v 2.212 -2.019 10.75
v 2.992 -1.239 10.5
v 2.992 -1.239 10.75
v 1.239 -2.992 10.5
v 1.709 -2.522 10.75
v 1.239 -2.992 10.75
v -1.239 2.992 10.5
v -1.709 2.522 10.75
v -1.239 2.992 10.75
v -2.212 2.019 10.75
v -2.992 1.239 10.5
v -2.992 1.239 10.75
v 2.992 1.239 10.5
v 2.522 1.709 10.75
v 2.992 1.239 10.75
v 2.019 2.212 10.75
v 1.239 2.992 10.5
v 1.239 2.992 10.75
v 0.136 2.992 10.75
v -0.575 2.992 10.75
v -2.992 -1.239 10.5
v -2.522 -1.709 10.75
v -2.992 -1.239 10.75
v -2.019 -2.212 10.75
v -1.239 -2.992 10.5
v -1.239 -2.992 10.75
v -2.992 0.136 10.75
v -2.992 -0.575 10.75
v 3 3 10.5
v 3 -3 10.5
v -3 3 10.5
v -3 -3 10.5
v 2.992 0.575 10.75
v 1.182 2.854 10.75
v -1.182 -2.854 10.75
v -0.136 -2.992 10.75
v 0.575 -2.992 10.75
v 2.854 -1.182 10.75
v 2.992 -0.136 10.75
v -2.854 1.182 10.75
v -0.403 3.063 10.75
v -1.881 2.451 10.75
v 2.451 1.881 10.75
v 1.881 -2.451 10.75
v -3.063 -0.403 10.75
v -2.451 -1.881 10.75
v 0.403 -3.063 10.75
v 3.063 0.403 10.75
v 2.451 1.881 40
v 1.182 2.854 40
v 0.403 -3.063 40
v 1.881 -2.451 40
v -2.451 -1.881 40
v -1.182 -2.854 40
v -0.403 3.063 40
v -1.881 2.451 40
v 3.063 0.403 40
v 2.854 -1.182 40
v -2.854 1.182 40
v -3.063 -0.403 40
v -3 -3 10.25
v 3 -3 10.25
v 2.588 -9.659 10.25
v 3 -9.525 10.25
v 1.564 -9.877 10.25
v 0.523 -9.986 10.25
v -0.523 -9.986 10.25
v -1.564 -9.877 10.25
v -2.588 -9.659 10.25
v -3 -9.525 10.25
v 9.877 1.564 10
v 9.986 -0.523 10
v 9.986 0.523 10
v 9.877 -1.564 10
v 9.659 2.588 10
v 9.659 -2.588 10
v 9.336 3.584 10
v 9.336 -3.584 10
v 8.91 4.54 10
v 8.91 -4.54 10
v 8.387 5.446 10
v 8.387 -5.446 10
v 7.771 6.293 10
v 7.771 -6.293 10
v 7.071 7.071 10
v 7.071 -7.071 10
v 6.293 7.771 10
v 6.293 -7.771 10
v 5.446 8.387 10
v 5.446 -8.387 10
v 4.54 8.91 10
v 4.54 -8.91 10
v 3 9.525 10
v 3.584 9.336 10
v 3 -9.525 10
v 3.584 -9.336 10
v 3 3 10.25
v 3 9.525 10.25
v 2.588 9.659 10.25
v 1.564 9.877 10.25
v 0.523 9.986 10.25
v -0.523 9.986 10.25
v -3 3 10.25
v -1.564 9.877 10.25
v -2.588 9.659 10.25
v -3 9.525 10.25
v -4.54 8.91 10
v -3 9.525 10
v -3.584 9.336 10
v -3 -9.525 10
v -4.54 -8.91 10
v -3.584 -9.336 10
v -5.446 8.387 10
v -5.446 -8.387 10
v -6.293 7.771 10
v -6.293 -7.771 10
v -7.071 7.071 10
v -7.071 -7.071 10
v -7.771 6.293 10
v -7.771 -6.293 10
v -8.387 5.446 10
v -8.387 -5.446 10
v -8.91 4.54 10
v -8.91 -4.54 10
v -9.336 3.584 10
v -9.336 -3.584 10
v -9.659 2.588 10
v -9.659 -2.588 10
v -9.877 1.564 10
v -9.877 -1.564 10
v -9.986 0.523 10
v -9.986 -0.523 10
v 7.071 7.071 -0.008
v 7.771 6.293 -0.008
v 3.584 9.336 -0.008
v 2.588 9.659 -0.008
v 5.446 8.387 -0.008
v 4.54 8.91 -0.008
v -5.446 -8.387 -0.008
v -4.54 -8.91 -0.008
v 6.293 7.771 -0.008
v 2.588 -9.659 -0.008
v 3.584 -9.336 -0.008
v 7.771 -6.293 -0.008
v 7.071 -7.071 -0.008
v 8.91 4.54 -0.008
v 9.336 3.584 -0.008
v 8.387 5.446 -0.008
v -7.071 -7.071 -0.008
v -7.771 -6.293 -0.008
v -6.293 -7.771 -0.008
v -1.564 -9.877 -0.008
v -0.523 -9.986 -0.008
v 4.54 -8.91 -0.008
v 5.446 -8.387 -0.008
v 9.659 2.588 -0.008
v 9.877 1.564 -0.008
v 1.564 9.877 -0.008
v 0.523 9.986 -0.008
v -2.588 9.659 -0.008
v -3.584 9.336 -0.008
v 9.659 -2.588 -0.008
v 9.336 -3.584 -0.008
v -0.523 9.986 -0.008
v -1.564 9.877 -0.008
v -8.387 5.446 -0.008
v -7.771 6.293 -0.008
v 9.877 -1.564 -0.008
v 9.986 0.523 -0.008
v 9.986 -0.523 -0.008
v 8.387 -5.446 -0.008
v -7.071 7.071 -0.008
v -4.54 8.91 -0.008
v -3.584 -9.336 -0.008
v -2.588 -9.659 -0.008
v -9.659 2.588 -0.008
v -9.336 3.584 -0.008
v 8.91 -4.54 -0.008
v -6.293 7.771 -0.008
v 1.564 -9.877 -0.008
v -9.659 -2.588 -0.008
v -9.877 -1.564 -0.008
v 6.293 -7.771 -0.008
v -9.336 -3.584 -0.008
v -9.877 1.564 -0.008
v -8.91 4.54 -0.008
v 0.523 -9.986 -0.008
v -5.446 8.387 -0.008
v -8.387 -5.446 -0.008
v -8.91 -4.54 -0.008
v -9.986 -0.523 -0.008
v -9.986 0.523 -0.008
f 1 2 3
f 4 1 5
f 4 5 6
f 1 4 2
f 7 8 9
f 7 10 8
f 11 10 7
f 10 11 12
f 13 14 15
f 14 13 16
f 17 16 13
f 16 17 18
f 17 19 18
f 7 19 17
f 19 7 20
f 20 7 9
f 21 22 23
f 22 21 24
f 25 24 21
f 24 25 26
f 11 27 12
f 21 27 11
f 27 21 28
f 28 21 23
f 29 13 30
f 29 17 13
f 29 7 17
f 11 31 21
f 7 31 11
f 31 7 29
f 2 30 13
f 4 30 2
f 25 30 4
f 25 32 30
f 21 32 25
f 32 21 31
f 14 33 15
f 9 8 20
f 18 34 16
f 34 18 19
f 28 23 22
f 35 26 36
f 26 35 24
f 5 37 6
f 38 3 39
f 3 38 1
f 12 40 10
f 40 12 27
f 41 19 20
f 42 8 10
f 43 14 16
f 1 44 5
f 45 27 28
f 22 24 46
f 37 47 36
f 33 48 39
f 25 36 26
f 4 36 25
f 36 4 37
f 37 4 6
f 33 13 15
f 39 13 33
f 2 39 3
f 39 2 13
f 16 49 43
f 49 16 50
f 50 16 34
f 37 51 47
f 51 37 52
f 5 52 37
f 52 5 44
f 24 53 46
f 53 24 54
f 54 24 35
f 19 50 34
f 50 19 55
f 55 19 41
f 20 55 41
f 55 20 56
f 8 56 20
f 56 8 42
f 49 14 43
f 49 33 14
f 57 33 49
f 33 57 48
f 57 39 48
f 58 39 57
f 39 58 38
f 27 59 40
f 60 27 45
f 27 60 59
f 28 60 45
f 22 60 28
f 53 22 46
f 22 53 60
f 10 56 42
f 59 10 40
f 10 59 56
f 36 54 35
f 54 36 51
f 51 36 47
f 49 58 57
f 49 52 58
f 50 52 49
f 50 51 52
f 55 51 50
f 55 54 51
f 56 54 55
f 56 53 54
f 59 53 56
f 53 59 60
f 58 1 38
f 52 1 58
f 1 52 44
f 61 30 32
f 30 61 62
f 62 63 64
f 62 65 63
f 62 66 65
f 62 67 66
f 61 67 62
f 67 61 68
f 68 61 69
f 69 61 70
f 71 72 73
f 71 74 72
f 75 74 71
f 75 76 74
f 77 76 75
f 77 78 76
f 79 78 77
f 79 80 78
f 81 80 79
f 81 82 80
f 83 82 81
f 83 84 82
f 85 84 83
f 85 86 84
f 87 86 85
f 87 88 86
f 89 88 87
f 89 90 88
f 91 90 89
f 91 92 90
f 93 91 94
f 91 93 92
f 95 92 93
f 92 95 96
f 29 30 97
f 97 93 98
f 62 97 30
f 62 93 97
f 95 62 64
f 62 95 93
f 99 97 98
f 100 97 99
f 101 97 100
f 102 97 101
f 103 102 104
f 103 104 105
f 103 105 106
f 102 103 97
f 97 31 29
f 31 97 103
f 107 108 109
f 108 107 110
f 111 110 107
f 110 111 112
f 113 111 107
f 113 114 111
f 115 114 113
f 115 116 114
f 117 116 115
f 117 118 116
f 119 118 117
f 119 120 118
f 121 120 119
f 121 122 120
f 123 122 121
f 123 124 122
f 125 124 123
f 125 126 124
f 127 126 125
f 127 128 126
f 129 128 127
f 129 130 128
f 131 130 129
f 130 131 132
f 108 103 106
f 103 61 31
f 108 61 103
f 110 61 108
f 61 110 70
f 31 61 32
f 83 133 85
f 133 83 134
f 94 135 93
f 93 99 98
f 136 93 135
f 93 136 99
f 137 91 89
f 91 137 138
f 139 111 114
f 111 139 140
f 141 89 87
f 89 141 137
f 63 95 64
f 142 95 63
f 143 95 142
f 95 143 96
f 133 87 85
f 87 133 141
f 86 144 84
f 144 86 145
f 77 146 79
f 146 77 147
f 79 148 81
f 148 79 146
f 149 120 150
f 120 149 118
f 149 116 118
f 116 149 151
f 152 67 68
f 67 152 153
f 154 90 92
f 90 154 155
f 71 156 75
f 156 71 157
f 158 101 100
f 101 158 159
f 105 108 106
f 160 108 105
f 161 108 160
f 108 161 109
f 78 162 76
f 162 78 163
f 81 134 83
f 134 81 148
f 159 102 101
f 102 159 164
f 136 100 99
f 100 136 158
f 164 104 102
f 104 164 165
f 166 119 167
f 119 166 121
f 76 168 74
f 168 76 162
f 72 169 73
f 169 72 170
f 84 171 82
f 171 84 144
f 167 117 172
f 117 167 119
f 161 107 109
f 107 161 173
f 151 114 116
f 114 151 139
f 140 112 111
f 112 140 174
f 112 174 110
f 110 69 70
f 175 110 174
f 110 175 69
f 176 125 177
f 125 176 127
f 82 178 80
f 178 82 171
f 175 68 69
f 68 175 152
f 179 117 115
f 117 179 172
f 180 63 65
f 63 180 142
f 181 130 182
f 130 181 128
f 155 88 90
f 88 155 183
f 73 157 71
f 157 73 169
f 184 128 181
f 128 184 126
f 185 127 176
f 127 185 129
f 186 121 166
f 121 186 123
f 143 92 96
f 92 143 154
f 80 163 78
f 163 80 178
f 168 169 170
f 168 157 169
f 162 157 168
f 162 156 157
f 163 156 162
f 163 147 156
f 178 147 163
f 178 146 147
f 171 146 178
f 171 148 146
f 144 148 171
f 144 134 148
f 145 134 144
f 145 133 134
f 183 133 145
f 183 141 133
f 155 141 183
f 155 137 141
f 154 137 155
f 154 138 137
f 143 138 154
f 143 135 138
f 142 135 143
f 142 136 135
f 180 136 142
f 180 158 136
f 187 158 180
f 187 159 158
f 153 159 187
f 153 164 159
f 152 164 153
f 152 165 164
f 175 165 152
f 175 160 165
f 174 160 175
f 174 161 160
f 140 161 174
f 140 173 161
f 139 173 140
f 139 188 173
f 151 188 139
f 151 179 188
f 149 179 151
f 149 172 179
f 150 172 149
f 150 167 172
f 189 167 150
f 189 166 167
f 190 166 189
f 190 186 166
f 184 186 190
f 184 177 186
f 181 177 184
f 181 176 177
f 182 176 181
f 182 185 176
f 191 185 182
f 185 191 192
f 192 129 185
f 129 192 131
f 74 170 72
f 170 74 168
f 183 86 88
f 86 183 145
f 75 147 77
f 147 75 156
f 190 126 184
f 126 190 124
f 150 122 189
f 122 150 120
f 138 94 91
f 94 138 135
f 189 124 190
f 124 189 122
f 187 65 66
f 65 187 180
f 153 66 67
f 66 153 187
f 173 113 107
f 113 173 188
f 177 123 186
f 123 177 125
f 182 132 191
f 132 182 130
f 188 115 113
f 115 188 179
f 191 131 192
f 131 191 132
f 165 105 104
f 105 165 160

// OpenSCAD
// file: ../utils/core/clip.scad
//
// NopSCADlib Copyright Chris Palmer 2018
// nop.head@gmail.com
// hydraraptor.blogspot.com
//
// This file is part of NopSCADlib.
//
// NopSCADlib is free software: you can redistribute it and/or modify it under the terms of the
// GNU General Public License as published by the Free Software Foundation, either version 3 of
// the License, or (at your option) any later version.
//
// NopSCADlib is distributed in the hope that it will be useful, but WITHOUT ANY WARRANTY;
// without even the implied warranty of MERCHANTABILITY or FITNESS FOR A PARTICULAR PURPOSE.
// See the GNU General Public License for more details.
//
// You should have received a copy of the GNU General Public License along with NopSCADlib.
// If not, see <https://www.gnu.org/licenses/>.
//

//
//! Construct arbirarily large box to partition 3D space and clip objects, useful for creating cross sections to see the inside when debugging.
//!
//! Original version by Doug Moen on the OpenSCAD forum
//
//
module box(xmin, ymin, zmin, xmax, ymax, zmax) //! Construct a box given its bounds
    polyhedron(
        [[xmin, ymin, zmin],  // 0
         [xmin, ymin, zmax],  // 1
         [xmin, ymax, zmin],  // 2
         [xmin, ymax, zmax],  // 3
         [xmax, ymin, zmin],  // 4
         [xmax, ymin, zmax],  // 5
         [xmax, ymax, zmin],  // 6
         [xmax, ymax, zmax]], // 7
        [[7,5,1,3],  // top
         [2,0,4,6],  // bottom
         [5,4,0,1],  // front
         [3,2,6,7],  // back
         [5,7,6,4],  // right
         [0,2,3,1]]  // left
    );

module clip(xmin = -inf, ymin = -inf, zmin = -inf, xmax = inf, ymax = inf, zmax = inf) //! Clip child to specified boundaries
    render() intersection() {
        children();

        box(xmin, ymin, zmin, xmax, ymax, zmax);
    }
// file: ../utils/core/rounded_rectangle.scad
//
// NopSCADlib Copyright Chris Palmer 2018
// nop.head@gmail.com
// hydraraptor.blogspot.com
//
// This file is part of NopSCADlib.
//
// NopSCADlib is free software: you can redistribute it and/or modify it under the terms of the
// GNU General Public License as published by the Free Software Foundation, either version 3 of
// the License, or (at your option) any later version.
//
// NopSCADlib is distributed in the hope that it will be useful, but WITHOUT ANY WARRANTY;
// without even the implied warranty of MERCHANTABILITY or FITNESS FOR A PARTICULAR PURPOSE.
// See the GNU General Public License for more details.
//
// You should have received a copy of the GNU General Public License along with NopSCADlib.
// If not, see <https://www.gnu.org/licenses/>.
//

//
//! Rectangle with rounded corners.
//
module rounded_square(size, r, center = true) //! Like ```square()``` but with with rounded corners
{
    $fn = r2sides4n(r);
    offset(r) offset(-r) square(size, center = center);
}

module rounded_rectangle(size, r, center = true, xy_center = true) //! Like ```cube()``` but corners rounded in XY plane and separate centre options for xy and z.
{
    linear_extrude(height = size[2], center = center)
        rounded_square([size[0], size[1]], r, xy_center);
}
// file: ../utils/core/teardrops.scad
//
// NopSCADlib Copyright Chris Palmer 2018
// nop.head@gmail.com
// hydraraptor.blogspot.com
//
// This file is part of NopSCADlib.
//
// NopSCADlib is free software: you can redistribute it and/or modify it under the terms of the
// GNU General Public License as published by the Free Software Foundation, either version 3 of
// the License, or (at your option) any later version.
//
// NopSCADlib is distributed in the hope that it will be useful, but WITHOUT ANY WARRANTY;
// without even the implied warranty of MERCHANTABILITY or FITNESS FOR A PARTICULAR PURPOSE.
// See the GNU General Public License for more details.
//
// You should have received a copy of the GNU General Public License along with NopSCADlib.
// If not, see <https://www.gnu.org/licenses/>.
//

//
//! For making horizontal holes that don't need support material.
//! Small holes can get away without it, but they print better with truncated teardrops.
//
module teardrop(h, r, center = true, truncate = true) //! For making horizontal holes that don't need support material, set ```truncate = false``` to make traditional RepRap teardrops that don't even need bridging
    render(convexity = 5)
        extrude_if(h, center)
           hull() {
                circle4n(r);

                if(truncate)
                    translate([0, r / 2])
                        square([2 * r * (sqrt(2) - 1), r], center = true);
                else
                    polygon([[0, 0], [eps, 0], [0, r * sqrt(2)]]);
            }

module teardrop_plus(h, r, center = true, truncate = true) //! Slightly bigger teardrop to allow for the 3D printing staircase effect
    teardrop(h, r + layer_height / 4, center, truncate);

module tearslot(h, r, w, center = true) //! A horizontal slot that doesn't need support material
    extrude_if(h, center)
        hull() {
            translate([-w/2,0,0]) teardrop(r = r, h = 0);
            translate([ w/2,0,0]) teardrop(r = r, h = 0);
        }

module vertical_tearslot(h, r, l, center = true) //! A vertical slot that doesn't need support material
    extrude_if(h, center)
        hull() {
            translate([0,  l / 2]) teardrop(0, r, true);
            translate([0, -l / 2])
                circle4n(r);
        }
// file: ../utils/core/polyholes.scad
//
// NopSCADlib Copyright Chris Palmer 2018
// nop.head@gmail.com
// hydraraptor.blogspot.com
//
// This file is part of NopSCADlib.
//
// NopSCADlib is free software: you can redistribute it and/or modify it under the terms of the
// GNU General Public License as published by the Free Software Foundation, either version 3 of
// the License, or (at your option) any later version.
//
// NopSCADlib is distributed in the hope that it will be useful, but WITHOUT ANY WARRANTY;
// without even the implied warranty of MERCHANTABILITY or FITNESS FOR A PARTICULAR PURPOSE.
// See the GNU General Public License for more details.
//
// You should have received a copy of the GNU General Public License along with NopSCADlib.
// If not, see <https://www.gnu.org/licenses/>.
//

//
//! A method of making 3D printed holes come out the right size regardless of the printer, providing
//! it gets the linear dimensions right. See <https://hydraraptor.blogspot.com/2011/02/polyholes.html>
//!
//! The module provides `poly_circle()`, `poly_cylinder()` and `poly_ring()` that is useful for making printed washers and pillars.
//
function sides(r) = max(round(4 * r), 3); //! Optimium number of sides for specified radius
function corrected_radius(r, n = 0)   = r / cos(180 / (n ? n : sides(r))); //! Adjusted radius to make flats lie on the circle
function corrected_diameter(d, n = 0) = d / cos(180 / (n ? n : sides(d / 2))); //! Adjusted diameter to make flats lie on the circle

module poly_circle(r, sides = 0) { //! Make a circle adjusted to print the correct size
    n = sides ? sides : sides(r);
    circle(r = corrected_radius(r,n), $fn = n);
}

module poly_cylinder(r, h, center = false, sides = 0) //! Make a cylinder adjusted to print the correct size
    extrude_if(h, center)
        poly_circle(r, sides);

module poly_ring(or, ir) { //! Make a 2D ring adjusted to have the correct internal radius
    cir = corrected_radius(ir);
    filaments = floor((or - cir) / extrusion_width);
    if(filaments > 3)
        difference() {
            circle(or);

            poly_circle(ir);
        }
    else
        if(filaments >= 2)
            difference() {
                offset(or - cir)
                    poly_circle(ir);

                poly_circle(ir);
            }
            else
                difference() {
                    poly_circle(or);

                    offset(-squeezed_wall)
                        poly_circle(or);
                }
}

module drill(r, h = 100) //! Make a cylinder for drilling holes suitable for CNC routing, set h = 0 for circle
    extrude_if(h)
        circle(r = corrected_radius(r, r2sides(r)));
//
// Horizontal slot
//
module slot(r, l, h = 100) //! Make a horizontal slot suitable for CNC routing, set h = 0 for 2D version
    extrude_if(h)
        hull() {
            translate([l / 2,0])
                drill(r, 0);

            translate([-l / 2,0])
                drill(r, 0);
        }
// file: ../utils/core/bom.scad
//
// NopSCADlib Copyright Chris Palmer 2018
// nop.head@gmail.com
// hydraraptor.blogspot.com
//
// This file is part of NopSCADlib.
//
// NopSCADlib is free software: you can redistribute it and/or modify it under the terms of the
// GNU General Public License as published by the Free Software Foundation, either version 3 of
// the License, or (at your option) any later version.
//
// NopSCADlib is distributed in the hope that it will be useful, but WITHOUT ANY WARRANTY;
// without even the implied warranty of MERCHANTABILITY or FITNESS FOR A PARTICULAR PURPOSE.
// See the GNU General Public License for more details.
//
// You should have received a copy of the GNU General Public License along with NopSCADlib.
// If not, see <https://www.gnu.org/licenses/>.
//

//
//! Bill Of Materials generation via echo and the ```bom.py``` script. Also handles exploded assembly views and posing. Assembly instructions can precede the module
//! definition that makes the assembly.
//!
//! The example below shows how to define a vitamin and incorporate it into an assembly with sub-assemblies and make an exploded view. The resulting flat BOM is shown but
//! heirachical BOMs are also generated for real projects.
//
function bom_mode(n = 1) = $_bom >= n && (is_undef($on_bom) || $on_bom);  //! Current BOM mode, 0 = none, 1 = printed and routed parts and assemblies, 2 includes vitamins as well
function exploded() = is_undef($exploded_parent) ? $exploded : 0;   //! Returns the value of ```$exploded``` if it is defined, else ```0```
function show_supports() = !$preview || exploded();                 //! True if printed support material should be shown

module no_explode() let($exploded_parent = true) children();        //! Prevent children being exploded
module no_pose() let($posed = true) children();                     //! Force children not to be posed even if parent is

module explode(d, explode_children = false, offset = [0,0,0]) {     //! Explode children by specified Z distance or vector ```d```, option to explode grand children
    v = is_list(d) ? d : [0, 0, d];
    o = is_list(offset) ? offset : [0, 0, offset];
    if($exploded && is_undef($exploded_parent)) {
        translate(o)                                                // Draw the line first in case the child is transparent
            hull() {
                sphere(0.2);

                translate(v * $exploded)
                    sphere(0.2);
            }

        translate(v * $exploded)
            let($exploded_parent = explode_children ? undef : true)
                children();
    }
    else
        children();
}

module pose(a = [55, 0, 25], t = [0, 0, 0], exploded = undef)       //! Pose an STL or assembly for rendering to png by specifying rotation ```a``` and translation ```t```, ```exploded = true for``` just the exploded view or ```false``` for unexploded only.
    if(is_undef($pose) || !is_undef($posed) || (!is_undef(exploded) && exploded != !!exploded()))
        children();
    else
        let($posed = true) // only pose the top level
            rotate([55, 0, 25])
                rotate([-a.x, 0, 0])
                    rotate([0, -a.y, 0])
                        rotate([0, 0, -a.z])
                            translate(-t)
                                children();


module assembly(name) {                 //! Name an assembly that will appear on the BOM, there needs to a module named ```<name>_assembly``` to make it
    if(bom_mode())
        echo(str("~", name, "_assembly{"));

    no_pose()
        if(is_undef($child_assembly))
            let($child_assembly = true)
                children();
        else
            no_explode()
                children();

    if(bom_mode())
        echo(str("~}", name, "_assembly"));
}

module stl(name) {                      //! Name an stl that will appear on the BOM, there needs to a module named ```<name>_stl``` to make it
    if(bom_mode())
        echo(str("~", name, ".stl"));
}

module dxf(name) {                      //! Name a dxf that will appear on the BOM, there needs to a module named ```<name>_dxf``` to make it
    if(bom_mode())
        echo(str("~", name, ".dxf"));
}

function value_string(value) = is_string(value) ? str("\"", value, "\"") : str(value); //! Convert ```value``` to a string or quote it if it is already a string

function arg(value, default, name = "") =   //! Create string for arg if not default, helper for ```vitamin()```
    value == default ? ""
                     : name ? str(", ", name, " = ", value_string(value))
                            : str(", ", value_string(value));

module vitamin(description) {                //! Describe a vitamin for the BOM entry and precede it with a module call that creates it, eg. "wigit(42): Type 42 widget"
    if(bom_mode(2))
        echo(str("~", description, !is_undef($hidden) ? " - not shown" : ""));
}

module not_on_bom(on = false)               //! Specify the following child parts are not on the BOM, for example when they are on a PCB that comes assembled
    let($on_bom = on)
        children();

module hidden()                             //! Make item invisible, except on the BOM
    scale(1 / sqr(1024))
        let($hidden = true)
            children();
// file: ../utils/core/sphere.scad
//
// NopSCADlib Copyright Chris Palmer 2018
// nop.head@gmail.com
// hydraraptor.blogspot.com
//
// This file is part of NopSCADlib.
//
// NopSCADlib is free software: you can redistribute it and/or modify it under the terms of the
// GNU General Public License as published by the Free Software Foundation, either version 3 of
// the License, or (at your option) any later version.
//
// NopSCADlib is distributed in the hope that it will be useful, but WITHOUT ANY WARRANTY;
// without even the implied warranty of MERCHANTABILITY or FITNESS FOR A PARTICULAR PURPOSE.
// See the GNU General Public License for more details.
//
// You should have received a copy of the GNU General Public License along with NopSCADlib.
// If not, see <https://www.gnu.org/licenses/>.
//

//! Redefines `sphere()` to always have a vertex on all six half axes I.e. vertices at the poles and the equator and `$fn` a multiple of four.
//! This ensures `hull` and `minkowski` results have the correct dimensions when spheres are placed at the corners.

module sphere(r = 1, d = undef) {                   //! Override ```sphere``` so that has vertices on all three axes. Has the advantage of giving correct dimensions when hulled
    R = is_undef(d) ? r : d / 2;
    rotate_extrude($fn = r2sides4n(R))
        rotate(-90)
            semi_circle(R);
}
// file: ../utils/core/global.scad
//
// NopSCADlib Copyright Chris Palmer 2018
// nop.head@gmail.com
// hydraraptor.blogspot.com
//
// This file is part of NopSCADlib.
//
// NopSCADlib is free software: you can redistribute it and/or modify it under the terms of the
// GNU General Public License as published by the Free Software Foundation, either version 3 of
// the License, or (at your option) any later version.
//
// NopSCADlib is distributed in the hope that it will be useful, but WITHOUT ANY WARRANTY;
// without even the implied warranty of MERCHANTABILITY or FITNESS FOR A PARTICULAR PURPOSE.
// See the GNU General Public License for more details.
//
// You should have received a copy of the GNU General Public License along with NopSCADlib.
// If not, see <https://www.gnu.org/licenses/>.
//

//
//! Global constants, functions and modules. This file is used directly or indirectly in every scad file.
//
include <../../global_defs.scad>

function sqr(x) = x * x;                                                            //! Returns the square of ```x```
function inch(x) = x * 25.4;                                                        //! Inch to mm conversion
function echoit(x) = echo(x) x;                                                     //! Echo expression and return it, useful for debugging
function in(list, x) = !!len([for(v = list) if(v == x) true]);                      //! Returns true if ```x``` is an element in the ```list```
function Len(x) = is_list(x) ? len(x) : 0;                                          //! Returns the length of a list or 0 if ```x``` is not a list
function r2sides(r) = $fn ? $fn : ceil(max(min(360/ $fa, r * 2 * PI / $fs), 5));    //! Replicates the OpenSCAD logic to calculate the number of sides from the radius
function r2sides4n(r) = floor((r2sides(r) + 3) / 4) * 4;                            //! Round up the number of sides to a multiple of 4 to ensure points land on all axes

module translate_z(z) translate([0, 0, z]) children();                              //! Shortcut for Z only translations
module vflip() rotate([180, 0, 0]) children();                                      //! Invert children by doing a 180 flip around the X axis
module ellipse(xr, yr) scale([1, yr / xr]) circle4n(xr);                            //! Draw an ellipse

module extrude_if(h, center = true)                 //! Extrudes 2D object to 3D when ```h``` is nonzero, otherwise leaves it 2D
    if(h)
        linear_extrude(height = h, center = center) // 3D
            children();
    else
        children();                                 // 2D

module circle4n(r, d = undef) {                     //! Circle with multiple of 4 vertices
    R = is_undef(d) ? r : d / 2;
    circle(R, $fn = r2sides4n(R));
}

module semi_circle(r, d = undef)                    //! A semi circle in the positive Y domain
    intersection() {
        R = is_undef(d) ? r : d / 2;
        circle4n(R);

        sq = R + 1;
        translate([-sq, 0])
            square([2 * sq, sq]);
    }

include <sphere.scad>
include <bom.scad>
include <polyholes.scad>
include <teardrops.scad>
include <rounded_rectangle.scad>
include <clip.scad>
// file: ../core.scad
//
// NopSCADlib Copyright Chris Palmer 2018
// nop.head@gmail.com
// hydraraptor.blogspot.com
//
// This file is part of NopSCADlib.
//
// NopSCADlib is free software: you can redistribute it and/or modify it under the terms of the
// GNU General Public License as published by the Free Software Foundation, either version 3 of
// the License, or (at your option) any later version.
//
// NopSCADlib is distributed in the hope that it will be useful, but WITHOUT ANY WARRANTY;
// without even the implied warranty of MERCHANTABILITY or FITNESS FOR A PARTICULAR PURPOSE.
// See the GNU General Public License for more details.
//
// You should have received a copy of the GNU General Public License along with NopSCADlib.
// If not, see <https://www.gnu.org/licenses/>.
//

//
// Include this file to use the library
//
include <global_defs.scad>
//
// Global functions and modules
//
use <utils/core/global.scad>
// file: ../utils/hanging_hole.scad
//
// NopSCADlib Copyright Chris Palmer 2018
// nop.head@gmail.com
// hydraraptor.blogspot.com
//
// This file is part of NopSCADlib.
//
// NopSCADlib is free software: you can redistribute it and/or modify it under the terms of the
// GNU General Public License as published by the Free Software Foundation, either version 3 of
// the License, or (at your option) any later version.
//
// NopSCADlib is distributed in the hope that it will be useful, but WITHOUT ANY WARRANTY;
// without even the implied warranty of MERCHANTABILITY or FITNESS FOR A PARTICULAR PURPOSE.
// See the GNU General Public License for more details.
//
// You should have received a copy of the GNU General Public License along with NopSCADlib.
// If not, see <https://www.gnu.org/licenses/>.
//

//
//! Method to print holes in mid air. See <https://hydraraptor.blogspot.com/2014/03/buried-nuts-and-hanging-holes.html>
//
include <../core.scad>

module hanging_hole(z, ir, h = 100, h2 = 100) { //! Hole radius ```ir``` hanging at the specified ```z``` value above a void who's shape is given by a 2D child
    module polyhole(r, h, n = 8) {
        if(h > 0)
            rotate(180 / n) {
                poly_cylinder(r = r, h = layer_height, sides = n);

                translate_z(layer_height)
                    if(2 * n <= sides(r))
                        polyhole(r - eps, h - layer_height, n * 2);
                    else
                        poly_cylinder(r - eps, h - layer_height);
            }
    }
    assert(z % layer_height == 0, str(z));
    infill_angle = z % (2 * layer_height) ? -45 : 45;
    below = min(z + eps, h2);
    big = 1000;

    render(convexity = 3) translate_z(z)
        union() {
            translate_z(2 * layer_height)
                polyhole(ir - eps, h - 2 * layer_height);

            difference() {
                translate_z(-below)
                    linear_extrude(height = below + 2 * layer_height)
                        children();

                rotate(infill_angle)
                    for(side = [-1, 1]) {
                        translate([side * (ir + big), 0, big + layer_height])
                            cube(2 * big, center = true);

                        translate([0, side * (ir + big), big])
                            cube(2 * big, center = true);

                    }
            }
        }
}
// file: ../global_defs.scad
//
// NopSCADlib Copyright Chris Palmer 2018
// nop.head@gmail.com
// hydraraptor.blogspot.com
//
// This file is part of NopSCADlib.
//
// NopSCADlib is free software: you can redistribute it and/or modify it under the terms of the
// GNU General Public License as published by the Free Software Foundation, either version 3 of
// the License, or (at your option) any later version.
//
// NopSCADlib is distributed in the hope that it will be useful, but WITHOUT ANY WARRANTY;
// without even the implied warranty of MERCHANTABILITY or FITNESS FOR A PARTICULAR PURPOSE.
// See the GNU General Public License for more details.
//
// You should have received a copy of the GNU General Public License along with NopSCADlib.
// If not, see <https://www.gnu.org/licenses/>.
//

//
// This file included directly or indirectly in every scad file.
//
// This scheme allows the following:
//  bom defaults to 0
//  Setting $bom on the command line or in the main file before including lib.scad overrides it everywhere.
//  Setting $bom after including lib overrides bom in the libs but not in the local file.
//  Setting $_bom in the local file overrides it in the local file but not in the libs.
//
//function is_undef(x) = x == undef;

$_bom           = is_undef($bom)             ? 0      : $bom;             // 0 no bom, 1 assemblies and stls, 2 vitamins as well
$exploded       = is_undef($explode)         ? 0      : $explode;         // 1 for exploded view
layer_height    = is_undef($layer_height)    ? 0.25   : $layer_height;    // layer heigth when printing
extrusion_width = is_undef($extrusion_width) ? 0.5    : $extrusion_width; // filament width when printing
nozzle          = is_undef($nozzle)          ? 0.45   : $nozzle;          // 3D printer nozzle
cnc_bit_r       = is_undef($cnc_bit_r)       ? 1.2    : $cnc_bit_r;       // miniumum tool radius when milling 2D objects
pp1_colour      = is_undef($pp1_colour)      ? "lime" : $pp1_colour;      // printed part colour 1
pp2_colour      = is_undef($pp2_colour)      ? "red"  : $pp2_colour;      // printed part colour 2
pp3_colour      = is_undef($pp3_colour)      ? "blue" : $pp3_colour;      // printed part colour 3
pp4_colour      = is_undef($pp4_colour)      ? "darkorange" : $pp4_colour;// printed part colour 4
show_rays       = is_undef($show_rays)       ? false  : $show_rays;       // show camera sight lines and light direction

// Minimum wall is about two filaments wide but we extrude it closer to get better bonding
squeezed_wall = $preview ? 2 * extrusion_width - layer_height * (1 - PI / 4)
                         : extrusion_width - layer_height / 2 + nozzle / 2 + extrusion_width / 2;

inf = 1e10;      // very big
eps = 1/128;     // small fudge factor to stop CSG barfing on coincident faces.
$fa = 6;
$fs = extrusion_width / 2;

function round_to_layer(z) = ceil(z / layer_height) * layer_height;
// Some additional named colors
grey20                          = [0.2, 0.2, 0.2];
grey30                          = [0.3, 0.3, 0.3];
grey40                          = [0.4, 0.4, 0.4];
grey50                          = [0.5, 0.5, 0.5];
grey60                          = [0.6, 0.6, 0.6];
grey70                          = [0.7, 0.7, 0.7];
grey80                          = [0.8, 0.8, 0.8];
grey90                          = [0.9, 0.9, 0.9];
brass                           = "gold";

/*
 * Enums
 */
//
// Screws
//
hs_cap    = 0;
hs_pan    = 1;
hs_cs     = 2;     // counter sunk
hs_hex    = 3;
hs_grub   = 4;     // pulley set screw
hs_cs_cap = 5;
hs_dome   = 6;
//
// Hot end descriptions
//
jhead   = 1;
e3d     = 2;
//
// Face enumeration
//
f_bottom = 0;
f_top    = 1;
f_left   = 2;
f_right  = 3;
f_front  = 4;
f_back   = 5;
// main file
//
// NopSCADlib Copyright Chris Palmer 2018
// nop.head@gmail.com
// hydraraptor.blogspot.com
//
// This file is part of NopSCADlib.
//
// NopSCADlib is free software: you can redistribute it and/or modify it under the terms of the
// GNU General Public License as published by the Free Software Foundation, either version 3 of
// the License, or (at your option) any later version.
//
// NopSCADlib is distributed in the hope that it will be useful, but WITHOUT ANY WARRANTY;
// without even the implied warranty of MERCHANTABILITY or FITNESS FOR A PARTICULAR PURPOSE.
// See the GNU General Public License for more details.
//
// You should have received a copy of the GNU General Public License along with NopSCADlib.
// If not, see <https://www.gnu.org/licenses/>.
//
include <../global_defs.scad>
use <../utils/hanging_hole.scad>

module hanging_holes() {
    rotate(45)
        #hanging_hole(z = 10, ir = 3, h = 30)
            circle(r = 10);
}

hanging_holes();
